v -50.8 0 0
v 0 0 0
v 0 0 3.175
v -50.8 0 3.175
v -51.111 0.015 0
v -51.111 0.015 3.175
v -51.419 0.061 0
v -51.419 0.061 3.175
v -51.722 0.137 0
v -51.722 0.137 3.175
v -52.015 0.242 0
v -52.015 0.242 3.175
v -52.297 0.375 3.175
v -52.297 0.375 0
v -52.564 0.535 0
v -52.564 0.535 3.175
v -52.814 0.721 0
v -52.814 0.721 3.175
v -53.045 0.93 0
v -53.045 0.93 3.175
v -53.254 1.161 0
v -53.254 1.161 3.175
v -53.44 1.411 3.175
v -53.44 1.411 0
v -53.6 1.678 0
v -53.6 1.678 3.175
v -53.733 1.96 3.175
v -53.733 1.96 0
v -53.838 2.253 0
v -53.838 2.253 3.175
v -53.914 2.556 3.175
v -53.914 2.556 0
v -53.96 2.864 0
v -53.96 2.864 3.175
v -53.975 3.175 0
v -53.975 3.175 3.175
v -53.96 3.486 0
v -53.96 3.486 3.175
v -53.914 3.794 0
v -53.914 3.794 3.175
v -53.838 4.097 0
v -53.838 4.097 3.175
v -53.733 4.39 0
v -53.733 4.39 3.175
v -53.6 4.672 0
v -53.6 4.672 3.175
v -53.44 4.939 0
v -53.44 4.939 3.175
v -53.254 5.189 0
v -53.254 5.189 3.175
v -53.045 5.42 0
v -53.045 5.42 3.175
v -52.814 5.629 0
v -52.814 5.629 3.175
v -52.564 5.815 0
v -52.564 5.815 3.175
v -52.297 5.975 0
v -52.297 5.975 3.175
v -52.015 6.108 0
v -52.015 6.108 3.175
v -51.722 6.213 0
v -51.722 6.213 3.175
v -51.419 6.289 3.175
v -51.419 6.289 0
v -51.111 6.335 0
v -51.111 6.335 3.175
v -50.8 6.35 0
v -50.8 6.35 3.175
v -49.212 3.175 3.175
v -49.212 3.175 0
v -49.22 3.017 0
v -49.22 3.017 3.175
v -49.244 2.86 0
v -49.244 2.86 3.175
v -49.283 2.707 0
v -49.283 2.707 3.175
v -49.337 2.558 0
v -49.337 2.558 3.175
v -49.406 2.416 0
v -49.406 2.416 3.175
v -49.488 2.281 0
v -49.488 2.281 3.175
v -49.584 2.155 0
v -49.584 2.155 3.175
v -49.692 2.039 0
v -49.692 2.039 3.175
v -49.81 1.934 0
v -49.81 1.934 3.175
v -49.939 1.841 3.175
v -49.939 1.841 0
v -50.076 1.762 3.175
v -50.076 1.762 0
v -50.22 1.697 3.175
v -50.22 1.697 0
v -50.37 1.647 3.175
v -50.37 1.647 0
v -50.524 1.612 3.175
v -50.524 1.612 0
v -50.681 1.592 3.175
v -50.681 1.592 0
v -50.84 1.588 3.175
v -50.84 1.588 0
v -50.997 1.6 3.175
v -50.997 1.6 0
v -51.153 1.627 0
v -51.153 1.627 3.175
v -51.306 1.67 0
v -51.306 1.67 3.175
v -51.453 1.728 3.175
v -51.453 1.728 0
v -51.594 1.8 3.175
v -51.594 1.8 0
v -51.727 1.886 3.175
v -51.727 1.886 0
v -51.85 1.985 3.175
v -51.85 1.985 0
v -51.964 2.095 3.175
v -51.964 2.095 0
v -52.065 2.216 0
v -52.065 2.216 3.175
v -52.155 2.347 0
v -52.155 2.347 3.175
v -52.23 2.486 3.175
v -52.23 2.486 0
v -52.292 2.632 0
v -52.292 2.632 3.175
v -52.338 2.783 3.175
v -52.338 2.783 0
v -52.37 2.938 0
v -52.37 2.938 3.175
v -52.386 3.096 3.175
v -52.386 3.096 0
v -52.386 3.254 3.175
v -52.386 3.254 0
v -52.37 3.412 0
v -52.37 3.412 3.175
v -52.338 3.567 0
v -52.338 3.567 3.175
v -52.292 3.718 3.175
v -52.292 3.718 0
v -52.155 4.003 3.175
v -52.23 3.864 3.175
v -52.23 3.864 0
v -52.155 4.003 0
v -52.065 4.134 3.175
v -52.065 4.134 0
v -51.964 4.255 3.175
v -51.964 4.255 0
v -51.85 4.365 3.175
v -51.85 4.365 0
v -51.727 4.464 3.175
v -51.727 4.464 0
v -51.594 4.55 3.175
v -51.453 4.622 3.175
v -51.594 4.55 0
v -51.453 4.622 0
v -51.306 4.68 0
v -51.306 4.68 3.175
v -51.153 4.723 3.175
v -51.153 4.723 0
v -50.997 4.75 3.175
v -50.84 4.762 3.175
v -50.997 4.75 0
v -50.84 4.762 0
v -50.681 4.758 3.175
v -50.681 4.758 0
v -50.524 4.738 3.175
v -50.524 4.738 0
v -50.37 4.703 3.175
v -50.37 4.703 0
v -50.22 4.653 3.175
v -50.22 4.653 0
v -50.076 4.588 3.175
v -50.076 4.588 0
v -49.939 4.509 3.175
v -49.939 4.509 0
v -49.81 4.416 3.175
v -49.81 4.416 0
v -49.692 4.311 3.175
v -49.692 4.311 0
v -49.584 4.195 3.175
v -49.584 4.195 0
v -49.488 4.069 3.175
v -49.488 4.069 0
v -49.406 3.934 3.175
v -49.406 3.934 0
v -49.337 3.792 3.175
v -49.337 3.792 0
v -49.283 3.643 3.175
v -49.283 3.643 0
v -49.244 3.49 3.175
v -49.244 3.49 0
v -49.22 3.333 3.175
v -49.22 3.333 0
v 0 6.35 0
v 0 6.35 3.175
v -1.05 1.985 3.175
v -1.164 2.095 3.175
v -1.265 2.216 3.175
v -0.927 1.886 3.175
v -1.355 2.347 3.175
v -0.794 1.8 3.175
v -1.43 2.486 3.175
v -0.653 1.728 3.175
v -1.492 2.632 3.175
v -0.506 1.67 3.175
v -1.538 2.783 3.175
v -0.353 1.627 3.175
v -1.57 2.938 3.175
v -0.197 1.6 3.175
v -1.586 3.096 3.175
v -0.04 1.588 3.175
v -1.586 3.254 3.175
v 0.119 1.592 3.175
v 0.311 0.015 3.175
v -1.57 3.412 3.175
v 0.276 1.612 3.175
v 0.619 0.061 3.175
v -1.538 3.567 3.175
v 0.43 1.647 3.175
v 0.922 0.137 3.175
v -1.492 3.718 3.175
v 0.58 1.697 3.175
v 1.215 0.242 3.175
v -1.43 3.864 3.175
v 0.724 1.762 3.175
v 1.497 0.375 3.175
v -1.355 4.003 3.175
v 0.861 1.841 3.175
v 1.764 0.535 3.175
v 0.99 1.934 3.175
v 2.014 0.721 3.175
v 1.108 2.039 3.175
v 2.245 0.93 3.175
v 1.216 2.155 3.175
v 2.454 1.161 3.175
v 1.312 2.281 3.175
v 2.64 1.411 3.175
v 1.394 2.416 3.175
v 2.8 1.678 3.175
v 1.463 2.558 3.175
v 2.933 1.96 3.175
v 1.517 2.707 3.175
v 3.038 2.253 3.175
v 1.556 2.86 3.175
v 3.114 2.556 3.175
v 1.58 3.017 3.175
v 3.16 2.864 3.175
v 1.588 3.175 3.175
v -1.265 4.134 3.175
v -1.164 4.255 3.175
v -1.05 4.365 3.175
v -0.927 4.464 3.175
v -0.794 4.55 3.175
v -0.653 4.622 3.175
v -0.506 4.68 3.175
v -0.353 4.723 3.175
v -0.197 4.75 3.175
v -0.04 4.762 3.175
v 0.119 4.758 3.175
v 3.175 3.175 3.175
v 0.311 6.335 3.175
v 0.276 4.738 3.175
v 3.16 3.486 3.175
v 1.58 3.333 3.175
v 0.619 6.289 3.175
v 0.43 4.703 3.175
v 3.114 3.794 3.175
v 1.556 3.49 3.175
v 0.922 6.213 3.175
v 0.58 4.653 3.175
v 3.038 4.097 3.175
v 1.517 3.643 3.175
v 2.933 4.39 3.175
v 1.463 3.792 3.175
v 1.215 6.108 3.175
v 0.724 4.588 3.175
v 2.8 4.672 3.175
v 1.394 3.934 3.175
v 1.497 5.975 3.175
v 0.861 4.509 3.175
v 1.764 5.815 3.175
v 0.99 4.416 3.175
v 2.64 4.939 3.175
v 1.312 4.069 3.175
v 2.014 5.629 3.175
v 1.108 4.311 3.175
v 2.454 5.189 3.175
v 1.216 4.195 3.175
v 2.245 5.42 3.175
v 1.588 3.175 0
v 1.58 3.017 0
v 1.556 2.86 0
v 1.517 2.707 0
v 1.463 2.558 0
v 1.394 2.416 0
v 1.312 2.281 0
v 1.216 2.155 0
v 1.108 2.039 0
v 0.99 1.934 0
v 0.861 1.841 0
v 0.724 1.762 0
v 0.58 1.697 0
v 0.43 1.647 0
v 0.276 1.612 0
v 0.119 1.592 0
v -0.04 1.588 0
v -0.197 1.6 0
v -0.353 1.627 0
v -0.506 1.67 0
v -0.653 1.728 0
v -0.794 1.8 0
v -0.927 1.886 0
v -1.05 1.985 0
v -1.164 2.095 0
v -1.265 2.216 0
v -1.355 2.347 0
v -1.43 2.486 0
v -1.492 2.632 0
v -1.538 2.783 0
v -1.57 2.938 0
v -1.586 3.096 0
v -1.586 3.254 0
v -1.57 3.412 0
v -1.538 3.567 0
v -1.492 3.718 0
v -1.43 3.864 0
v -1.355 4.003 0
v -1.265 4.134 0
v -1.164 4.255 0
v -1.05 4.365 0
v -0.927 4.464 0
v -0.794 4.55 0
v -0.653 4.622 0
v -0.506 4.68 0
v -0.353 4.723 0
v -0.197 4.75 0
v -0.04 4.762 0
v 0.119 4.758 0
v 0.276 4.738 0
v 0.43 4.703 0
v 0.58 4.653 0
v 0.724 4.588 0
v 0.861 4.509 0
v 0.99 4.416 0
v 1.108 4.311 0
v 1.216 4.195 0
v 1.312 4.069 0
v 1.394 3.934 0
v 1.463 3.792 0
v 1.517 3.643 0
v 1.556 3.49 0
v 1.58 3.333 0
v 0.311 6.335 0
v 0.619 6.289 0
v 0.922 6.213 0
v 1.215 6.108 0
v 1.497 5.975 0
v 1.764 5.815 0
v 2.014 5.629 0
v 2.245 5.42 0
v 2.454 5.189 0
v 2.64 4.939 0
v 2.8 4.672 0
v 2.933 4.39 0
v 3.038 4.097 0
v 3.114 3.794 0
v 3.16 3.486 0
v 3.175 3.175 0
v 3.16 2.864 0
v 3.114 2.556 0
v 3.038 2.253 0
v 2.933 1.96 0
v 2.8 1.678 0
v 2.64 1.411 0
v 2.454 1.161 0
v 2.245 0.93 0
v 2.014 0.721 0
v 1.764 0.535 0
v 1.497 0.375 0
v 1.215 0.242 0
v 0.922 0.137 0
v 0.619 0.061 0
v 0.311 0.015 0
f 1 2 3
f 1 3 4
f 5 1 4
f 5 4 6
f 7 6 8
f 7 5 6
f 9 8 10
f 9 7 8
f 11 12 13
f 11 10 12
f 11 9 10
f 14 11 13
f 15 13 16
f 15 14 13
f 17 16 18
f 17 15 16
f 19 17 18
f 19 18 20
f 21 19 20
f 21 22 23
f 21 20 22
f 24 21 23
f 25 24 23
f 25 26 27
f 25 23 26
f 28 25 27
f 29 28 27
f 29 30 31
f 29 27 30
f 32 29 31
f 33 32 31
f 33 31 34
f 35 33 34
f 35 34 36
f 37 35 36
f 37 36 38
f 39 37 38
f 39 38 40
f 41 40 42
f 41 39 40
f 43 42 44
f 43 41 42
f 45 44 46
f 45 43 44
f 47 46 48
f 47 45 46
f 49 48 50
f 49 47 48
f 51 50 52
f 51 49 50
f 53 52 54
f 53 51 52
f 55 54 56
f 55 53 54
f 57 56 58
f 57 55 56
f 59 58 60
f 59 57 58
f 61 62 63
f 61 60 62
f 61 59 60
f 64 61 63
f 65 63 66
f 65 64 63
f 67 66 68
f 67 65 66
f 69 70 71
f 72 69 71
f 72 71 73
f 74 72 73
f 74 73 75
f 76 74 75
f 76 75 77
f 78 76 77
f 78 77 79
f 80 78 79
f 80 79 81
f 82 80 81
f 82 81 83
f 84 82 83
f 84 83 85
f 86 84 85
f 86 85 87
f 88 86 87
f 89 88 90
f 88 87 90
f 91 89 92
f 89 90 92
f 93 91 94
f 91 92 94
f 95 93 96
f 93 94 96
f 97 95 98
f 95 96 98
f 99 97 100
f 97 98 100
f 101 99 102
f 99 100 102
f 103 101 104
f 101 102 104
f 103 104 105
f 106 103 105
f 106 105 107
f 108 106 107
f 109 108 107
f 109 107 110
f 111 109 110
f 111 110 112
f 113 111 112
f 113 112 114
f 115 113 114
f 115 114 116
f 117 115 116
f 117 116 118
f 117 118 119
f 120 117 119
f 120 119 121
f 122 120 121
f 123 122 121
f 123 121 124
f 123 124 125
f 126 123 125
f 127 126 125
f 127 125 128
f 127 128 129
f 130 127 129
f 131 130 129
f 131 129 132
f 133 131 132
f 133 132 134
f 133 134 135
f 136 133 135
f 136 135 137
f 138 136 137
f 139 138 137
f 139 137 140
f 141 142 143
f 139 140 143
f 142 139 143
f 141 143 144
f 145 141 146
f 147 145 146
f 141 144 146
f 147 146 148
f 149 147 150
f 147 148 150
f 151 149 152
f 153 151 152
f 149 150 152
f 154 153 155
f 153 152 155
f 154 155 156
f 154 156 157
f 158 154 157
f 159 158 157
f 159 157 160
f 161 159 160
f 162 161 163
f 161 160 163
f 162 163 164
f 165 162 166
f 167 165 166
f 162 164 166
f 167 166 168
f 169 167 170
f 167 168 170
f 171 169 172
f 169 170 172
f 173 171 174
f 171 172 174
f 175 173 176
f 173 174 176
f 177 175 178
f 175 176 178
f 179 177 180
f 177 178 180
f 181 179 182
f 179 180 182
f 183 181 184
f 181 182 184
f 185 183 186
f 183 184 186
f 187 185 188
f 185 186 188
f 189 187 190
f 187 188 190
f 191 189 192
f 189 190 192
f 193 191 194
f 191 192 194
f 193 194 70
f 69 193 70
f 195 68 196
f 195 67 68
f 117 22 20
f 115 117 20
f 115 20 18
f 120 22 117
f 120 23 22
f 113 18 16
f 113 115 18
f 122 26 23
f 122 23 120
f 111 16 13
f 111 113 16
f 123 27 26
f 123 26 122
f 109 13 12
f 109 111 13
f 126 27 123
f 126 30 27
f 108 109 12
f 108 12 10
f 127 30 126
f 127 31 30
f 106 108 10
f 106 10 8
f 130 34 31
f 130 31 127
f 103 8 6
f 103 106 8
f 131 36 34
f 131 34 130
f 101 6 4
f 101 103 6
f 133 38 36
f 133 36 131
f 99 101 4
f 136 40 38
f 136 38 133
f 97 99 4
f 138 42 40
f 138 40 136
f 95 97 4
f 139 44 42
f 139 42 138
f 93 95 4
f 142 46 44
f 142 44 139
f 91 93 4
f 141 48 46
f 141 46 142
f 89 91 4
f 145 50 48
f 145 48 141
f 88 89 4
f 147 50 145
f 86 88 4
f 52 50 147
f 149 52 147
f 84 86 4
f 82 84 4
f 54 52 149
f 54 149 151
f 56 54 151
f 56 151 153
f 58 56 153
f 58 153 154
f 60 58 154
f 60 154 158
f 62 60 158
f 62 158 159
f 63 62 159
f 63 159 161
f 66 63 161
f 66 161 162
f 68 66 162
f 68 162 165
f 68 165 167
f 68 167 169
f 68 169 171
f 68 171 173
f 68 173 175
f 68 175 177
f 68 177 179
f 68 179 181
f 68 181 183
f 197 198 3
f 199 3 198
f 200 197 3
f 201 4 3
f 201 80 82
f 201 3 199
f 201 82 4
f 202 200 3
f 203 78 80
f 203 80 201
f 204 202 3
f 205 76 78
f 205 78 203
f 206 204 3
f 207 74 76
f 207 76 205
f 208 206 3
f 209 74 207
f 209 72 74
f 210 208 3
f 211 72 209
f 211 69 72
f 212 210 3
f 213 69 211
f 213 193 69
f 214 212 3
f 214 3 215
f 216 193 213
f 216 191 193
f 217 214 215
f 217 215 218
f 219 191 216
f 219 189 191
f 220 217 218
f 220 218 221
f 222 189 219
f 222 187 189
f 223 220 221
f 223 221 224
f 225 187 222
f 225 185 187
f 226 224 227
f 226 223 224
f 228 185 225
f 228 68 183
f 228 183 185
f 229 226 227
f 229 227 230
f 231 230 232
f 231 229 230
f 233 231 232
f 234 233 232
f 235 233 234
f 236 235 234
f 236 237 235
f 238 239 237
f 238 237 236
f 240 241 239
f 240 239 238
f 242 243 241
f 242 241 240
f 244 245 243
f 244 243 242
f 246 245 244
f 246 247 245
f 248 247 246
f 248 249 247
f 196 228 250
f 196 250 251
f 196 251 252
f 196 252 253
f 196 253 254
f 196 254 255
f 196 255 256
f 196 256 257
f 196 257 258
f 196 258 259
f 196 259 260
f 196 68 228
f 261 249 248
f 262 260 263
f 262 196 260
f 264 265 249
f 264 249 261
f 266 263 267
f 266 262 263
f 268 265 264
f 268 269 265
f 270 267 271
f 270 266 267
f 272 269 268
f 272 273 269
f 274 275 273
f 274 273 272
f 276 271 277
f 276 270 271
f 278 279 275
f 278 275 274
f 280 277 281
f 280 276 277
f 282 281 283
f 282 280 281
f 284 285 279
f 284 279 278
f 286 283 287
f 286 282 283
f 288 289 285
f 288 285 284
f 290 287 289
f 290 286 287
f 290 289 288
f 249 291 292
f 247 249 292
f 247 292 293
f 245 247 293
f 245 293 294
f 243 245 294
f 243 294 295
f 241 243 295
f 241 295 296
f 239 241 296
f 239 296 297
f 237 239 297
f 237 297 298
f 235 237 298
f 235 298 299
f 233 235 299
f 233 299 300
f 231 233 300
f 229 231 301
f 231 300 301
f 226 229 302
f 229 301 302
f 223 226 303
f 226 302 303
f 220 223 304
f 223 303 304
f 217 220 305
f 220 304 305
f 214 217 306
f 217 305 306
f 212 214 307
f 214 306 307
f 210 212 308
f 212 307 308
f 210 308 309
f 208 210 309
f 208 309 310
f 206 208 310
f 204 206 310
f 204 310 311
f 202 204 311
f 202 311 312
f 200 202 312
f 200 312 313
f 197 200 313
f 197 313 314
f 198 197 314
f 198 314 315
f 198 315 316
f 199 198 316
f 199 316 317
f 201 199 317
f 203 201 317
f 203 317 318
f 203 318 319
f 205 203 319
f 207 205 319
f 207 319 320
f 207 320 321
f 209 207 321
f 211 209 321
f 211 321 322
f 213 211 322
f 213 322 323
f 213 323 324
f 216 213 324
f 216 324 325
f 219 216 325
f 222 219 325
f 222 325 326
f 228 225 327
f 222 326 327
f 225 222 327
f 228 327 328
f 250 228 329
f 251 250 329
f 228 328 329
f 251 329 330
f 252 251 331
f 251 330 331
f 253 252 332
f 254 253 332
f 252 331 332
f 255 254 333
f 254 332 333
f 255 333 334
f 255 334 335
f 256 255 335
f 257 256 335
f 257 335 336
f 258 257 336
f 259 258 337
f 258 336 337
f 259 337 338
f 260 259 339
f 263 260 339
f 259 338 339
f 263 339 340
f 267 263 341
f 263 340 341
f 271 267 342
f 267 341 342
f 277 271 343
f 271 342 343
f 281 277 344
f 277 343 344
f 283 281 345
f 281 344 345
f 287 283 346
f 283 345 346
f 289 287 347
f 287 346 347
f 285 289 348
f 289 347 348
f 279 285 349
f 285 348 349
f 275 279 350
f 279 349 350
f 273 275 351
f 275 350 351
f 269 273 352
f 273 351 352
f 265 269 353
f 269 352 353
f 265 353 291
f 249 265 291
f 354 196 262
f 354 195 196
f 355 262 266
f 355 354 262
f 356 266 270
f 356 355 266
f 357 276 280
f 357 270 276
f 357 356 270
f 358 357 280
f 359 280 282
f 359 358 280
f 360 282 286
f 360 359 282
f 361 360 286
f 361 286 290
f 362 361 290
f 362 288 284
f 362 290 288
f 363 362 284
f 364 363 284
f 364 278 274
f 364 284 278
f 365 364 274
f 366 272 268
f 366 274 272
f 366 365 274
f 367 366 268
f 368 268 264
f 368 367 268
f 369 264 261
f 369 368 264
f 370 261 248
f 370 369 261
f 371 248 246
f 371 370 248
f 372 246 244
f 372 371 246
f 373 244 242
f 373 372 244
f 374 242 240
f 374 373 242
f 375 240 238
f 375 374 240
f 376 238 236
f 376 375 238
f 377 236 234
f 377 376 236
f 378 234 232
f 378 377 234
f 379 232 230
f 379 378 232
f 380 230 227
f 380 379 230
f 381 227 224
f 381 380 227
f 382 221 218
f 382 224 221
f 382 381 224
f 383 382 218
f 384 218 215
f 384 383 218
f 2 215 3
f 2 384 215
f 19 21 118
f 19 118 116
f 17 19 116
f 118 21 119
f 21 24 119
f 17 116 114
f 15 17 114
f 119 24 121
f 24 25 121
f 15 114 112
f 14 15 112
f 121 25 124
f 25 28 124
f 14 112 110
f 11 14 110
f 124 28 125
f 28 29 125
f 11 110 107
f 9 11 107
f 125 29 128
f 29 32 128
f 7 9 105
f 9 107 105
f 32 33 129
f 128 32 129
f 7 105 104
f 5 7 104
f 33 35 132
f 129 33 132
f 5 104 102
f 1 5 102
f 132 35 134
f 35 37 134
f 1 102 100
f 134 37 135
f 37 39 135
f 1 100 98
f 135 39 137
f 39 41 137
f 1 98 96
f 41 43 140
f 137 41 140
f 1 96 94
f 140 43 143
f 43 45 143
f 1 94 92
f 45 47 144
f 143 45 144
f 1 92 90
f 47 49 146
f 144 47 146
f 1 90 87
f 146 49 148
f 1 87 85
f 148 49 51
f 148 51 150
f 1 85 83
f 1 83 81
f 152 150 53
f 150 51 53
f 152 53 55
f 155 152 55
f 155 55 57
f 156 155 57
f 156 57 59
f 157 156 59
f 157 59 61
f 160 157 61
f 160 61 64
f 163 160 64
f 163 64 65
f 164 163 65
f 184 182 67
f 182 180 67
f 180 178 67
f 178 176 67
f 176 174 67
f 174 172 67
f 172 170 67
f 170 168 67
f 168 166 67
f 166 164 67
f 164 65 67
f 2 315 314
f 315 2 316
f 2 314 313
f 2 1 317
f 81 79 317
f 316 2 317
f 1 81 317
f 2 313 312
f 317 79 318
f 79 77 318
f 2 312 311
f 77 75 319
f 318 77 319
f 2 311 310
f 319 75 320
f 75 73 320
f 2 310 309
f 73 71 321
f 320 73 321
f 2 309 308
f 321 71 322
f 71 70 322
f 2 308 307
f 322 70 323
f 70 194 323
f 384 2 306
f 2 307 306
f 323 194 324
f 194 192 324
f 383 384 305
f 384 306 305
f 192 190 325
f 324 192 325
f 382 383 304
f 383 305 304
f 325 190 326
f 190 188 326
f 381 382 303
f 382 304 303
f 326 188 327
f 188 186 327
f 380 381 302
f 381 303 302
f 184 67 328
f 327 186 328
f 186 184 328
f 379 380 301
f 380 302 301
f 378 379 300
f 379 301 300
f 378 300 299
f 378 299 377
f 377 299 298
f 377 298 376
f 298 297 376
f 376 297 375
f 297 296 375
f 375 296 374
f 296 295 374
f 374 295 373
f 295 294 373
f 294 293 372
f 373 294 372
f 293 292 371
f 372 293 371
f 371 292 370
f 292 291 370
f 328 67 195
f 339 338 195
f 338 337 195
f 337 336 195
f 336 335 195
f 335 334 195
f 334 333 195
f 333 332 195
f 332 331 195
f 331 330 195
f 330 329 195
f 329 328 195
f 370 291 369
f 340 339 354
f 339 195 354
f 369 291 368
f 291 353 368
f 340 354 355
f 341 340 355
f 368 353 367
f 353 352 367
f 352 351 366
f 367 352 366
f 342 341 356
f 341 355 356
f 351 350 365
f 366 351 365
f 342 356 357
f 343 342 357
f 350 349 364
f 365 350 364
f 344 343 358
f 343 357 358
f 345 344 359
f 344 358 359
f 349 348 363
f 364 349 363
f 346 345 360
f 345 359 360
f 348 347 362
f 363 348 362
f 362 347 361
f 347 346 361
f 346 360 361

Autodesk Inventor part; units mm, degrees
ref_plane "YZ Plane" through (0, 0, 0) normal (1, 0, 0) x (0, 1, 0)
ref_plane "XZ Plane" through (0, 0, 0) normal (0, 1, 0) x (-1, 0, 0)
ref_plane "XY Plane" through (0, 0, 0) normal (0, 0, 1) x (1, 0, 0)
sketch "Sketch1" plane through (0, 0, 0) normal (0, 0, 1) x (1, 0, 0)
  line L0 (0, 0) -> (-50.8, 0)
  line L1 (-50.8, 0) -> (-50.8, 6.35)
  line L2 (-50.8, 6.35) -> (0, 6.35)
  line L3 (0, 6.35) -> (0, 0)
  arc A0 (-50.8, 6.35) -> (-50.8, 0) centre (-50.8, 3.175) ccw
  arc A1 (0, 0) -> (0, 6.35) centre (0, 3.175) ccw
  circle A2 centre (-50.8, 3.175) radius 1.5875
  circle A3 centre (0, 3.175) radius 1.5875
  dimension "d0" = 50.8
  dimension "d1" = 6.35
  dimension "d2" = 3.175
  dimension "d3" = 3.175
  dimension "d4" = 3.175
extrude "Extrusion1" add sketch "Sketch1" along normal blind 3.175
extrude "Extrusion2" cut sketch "Sketch1" along normal blind 3.175 contours A3 L3 | L3 A3 | A2 L1 | L1 A2
